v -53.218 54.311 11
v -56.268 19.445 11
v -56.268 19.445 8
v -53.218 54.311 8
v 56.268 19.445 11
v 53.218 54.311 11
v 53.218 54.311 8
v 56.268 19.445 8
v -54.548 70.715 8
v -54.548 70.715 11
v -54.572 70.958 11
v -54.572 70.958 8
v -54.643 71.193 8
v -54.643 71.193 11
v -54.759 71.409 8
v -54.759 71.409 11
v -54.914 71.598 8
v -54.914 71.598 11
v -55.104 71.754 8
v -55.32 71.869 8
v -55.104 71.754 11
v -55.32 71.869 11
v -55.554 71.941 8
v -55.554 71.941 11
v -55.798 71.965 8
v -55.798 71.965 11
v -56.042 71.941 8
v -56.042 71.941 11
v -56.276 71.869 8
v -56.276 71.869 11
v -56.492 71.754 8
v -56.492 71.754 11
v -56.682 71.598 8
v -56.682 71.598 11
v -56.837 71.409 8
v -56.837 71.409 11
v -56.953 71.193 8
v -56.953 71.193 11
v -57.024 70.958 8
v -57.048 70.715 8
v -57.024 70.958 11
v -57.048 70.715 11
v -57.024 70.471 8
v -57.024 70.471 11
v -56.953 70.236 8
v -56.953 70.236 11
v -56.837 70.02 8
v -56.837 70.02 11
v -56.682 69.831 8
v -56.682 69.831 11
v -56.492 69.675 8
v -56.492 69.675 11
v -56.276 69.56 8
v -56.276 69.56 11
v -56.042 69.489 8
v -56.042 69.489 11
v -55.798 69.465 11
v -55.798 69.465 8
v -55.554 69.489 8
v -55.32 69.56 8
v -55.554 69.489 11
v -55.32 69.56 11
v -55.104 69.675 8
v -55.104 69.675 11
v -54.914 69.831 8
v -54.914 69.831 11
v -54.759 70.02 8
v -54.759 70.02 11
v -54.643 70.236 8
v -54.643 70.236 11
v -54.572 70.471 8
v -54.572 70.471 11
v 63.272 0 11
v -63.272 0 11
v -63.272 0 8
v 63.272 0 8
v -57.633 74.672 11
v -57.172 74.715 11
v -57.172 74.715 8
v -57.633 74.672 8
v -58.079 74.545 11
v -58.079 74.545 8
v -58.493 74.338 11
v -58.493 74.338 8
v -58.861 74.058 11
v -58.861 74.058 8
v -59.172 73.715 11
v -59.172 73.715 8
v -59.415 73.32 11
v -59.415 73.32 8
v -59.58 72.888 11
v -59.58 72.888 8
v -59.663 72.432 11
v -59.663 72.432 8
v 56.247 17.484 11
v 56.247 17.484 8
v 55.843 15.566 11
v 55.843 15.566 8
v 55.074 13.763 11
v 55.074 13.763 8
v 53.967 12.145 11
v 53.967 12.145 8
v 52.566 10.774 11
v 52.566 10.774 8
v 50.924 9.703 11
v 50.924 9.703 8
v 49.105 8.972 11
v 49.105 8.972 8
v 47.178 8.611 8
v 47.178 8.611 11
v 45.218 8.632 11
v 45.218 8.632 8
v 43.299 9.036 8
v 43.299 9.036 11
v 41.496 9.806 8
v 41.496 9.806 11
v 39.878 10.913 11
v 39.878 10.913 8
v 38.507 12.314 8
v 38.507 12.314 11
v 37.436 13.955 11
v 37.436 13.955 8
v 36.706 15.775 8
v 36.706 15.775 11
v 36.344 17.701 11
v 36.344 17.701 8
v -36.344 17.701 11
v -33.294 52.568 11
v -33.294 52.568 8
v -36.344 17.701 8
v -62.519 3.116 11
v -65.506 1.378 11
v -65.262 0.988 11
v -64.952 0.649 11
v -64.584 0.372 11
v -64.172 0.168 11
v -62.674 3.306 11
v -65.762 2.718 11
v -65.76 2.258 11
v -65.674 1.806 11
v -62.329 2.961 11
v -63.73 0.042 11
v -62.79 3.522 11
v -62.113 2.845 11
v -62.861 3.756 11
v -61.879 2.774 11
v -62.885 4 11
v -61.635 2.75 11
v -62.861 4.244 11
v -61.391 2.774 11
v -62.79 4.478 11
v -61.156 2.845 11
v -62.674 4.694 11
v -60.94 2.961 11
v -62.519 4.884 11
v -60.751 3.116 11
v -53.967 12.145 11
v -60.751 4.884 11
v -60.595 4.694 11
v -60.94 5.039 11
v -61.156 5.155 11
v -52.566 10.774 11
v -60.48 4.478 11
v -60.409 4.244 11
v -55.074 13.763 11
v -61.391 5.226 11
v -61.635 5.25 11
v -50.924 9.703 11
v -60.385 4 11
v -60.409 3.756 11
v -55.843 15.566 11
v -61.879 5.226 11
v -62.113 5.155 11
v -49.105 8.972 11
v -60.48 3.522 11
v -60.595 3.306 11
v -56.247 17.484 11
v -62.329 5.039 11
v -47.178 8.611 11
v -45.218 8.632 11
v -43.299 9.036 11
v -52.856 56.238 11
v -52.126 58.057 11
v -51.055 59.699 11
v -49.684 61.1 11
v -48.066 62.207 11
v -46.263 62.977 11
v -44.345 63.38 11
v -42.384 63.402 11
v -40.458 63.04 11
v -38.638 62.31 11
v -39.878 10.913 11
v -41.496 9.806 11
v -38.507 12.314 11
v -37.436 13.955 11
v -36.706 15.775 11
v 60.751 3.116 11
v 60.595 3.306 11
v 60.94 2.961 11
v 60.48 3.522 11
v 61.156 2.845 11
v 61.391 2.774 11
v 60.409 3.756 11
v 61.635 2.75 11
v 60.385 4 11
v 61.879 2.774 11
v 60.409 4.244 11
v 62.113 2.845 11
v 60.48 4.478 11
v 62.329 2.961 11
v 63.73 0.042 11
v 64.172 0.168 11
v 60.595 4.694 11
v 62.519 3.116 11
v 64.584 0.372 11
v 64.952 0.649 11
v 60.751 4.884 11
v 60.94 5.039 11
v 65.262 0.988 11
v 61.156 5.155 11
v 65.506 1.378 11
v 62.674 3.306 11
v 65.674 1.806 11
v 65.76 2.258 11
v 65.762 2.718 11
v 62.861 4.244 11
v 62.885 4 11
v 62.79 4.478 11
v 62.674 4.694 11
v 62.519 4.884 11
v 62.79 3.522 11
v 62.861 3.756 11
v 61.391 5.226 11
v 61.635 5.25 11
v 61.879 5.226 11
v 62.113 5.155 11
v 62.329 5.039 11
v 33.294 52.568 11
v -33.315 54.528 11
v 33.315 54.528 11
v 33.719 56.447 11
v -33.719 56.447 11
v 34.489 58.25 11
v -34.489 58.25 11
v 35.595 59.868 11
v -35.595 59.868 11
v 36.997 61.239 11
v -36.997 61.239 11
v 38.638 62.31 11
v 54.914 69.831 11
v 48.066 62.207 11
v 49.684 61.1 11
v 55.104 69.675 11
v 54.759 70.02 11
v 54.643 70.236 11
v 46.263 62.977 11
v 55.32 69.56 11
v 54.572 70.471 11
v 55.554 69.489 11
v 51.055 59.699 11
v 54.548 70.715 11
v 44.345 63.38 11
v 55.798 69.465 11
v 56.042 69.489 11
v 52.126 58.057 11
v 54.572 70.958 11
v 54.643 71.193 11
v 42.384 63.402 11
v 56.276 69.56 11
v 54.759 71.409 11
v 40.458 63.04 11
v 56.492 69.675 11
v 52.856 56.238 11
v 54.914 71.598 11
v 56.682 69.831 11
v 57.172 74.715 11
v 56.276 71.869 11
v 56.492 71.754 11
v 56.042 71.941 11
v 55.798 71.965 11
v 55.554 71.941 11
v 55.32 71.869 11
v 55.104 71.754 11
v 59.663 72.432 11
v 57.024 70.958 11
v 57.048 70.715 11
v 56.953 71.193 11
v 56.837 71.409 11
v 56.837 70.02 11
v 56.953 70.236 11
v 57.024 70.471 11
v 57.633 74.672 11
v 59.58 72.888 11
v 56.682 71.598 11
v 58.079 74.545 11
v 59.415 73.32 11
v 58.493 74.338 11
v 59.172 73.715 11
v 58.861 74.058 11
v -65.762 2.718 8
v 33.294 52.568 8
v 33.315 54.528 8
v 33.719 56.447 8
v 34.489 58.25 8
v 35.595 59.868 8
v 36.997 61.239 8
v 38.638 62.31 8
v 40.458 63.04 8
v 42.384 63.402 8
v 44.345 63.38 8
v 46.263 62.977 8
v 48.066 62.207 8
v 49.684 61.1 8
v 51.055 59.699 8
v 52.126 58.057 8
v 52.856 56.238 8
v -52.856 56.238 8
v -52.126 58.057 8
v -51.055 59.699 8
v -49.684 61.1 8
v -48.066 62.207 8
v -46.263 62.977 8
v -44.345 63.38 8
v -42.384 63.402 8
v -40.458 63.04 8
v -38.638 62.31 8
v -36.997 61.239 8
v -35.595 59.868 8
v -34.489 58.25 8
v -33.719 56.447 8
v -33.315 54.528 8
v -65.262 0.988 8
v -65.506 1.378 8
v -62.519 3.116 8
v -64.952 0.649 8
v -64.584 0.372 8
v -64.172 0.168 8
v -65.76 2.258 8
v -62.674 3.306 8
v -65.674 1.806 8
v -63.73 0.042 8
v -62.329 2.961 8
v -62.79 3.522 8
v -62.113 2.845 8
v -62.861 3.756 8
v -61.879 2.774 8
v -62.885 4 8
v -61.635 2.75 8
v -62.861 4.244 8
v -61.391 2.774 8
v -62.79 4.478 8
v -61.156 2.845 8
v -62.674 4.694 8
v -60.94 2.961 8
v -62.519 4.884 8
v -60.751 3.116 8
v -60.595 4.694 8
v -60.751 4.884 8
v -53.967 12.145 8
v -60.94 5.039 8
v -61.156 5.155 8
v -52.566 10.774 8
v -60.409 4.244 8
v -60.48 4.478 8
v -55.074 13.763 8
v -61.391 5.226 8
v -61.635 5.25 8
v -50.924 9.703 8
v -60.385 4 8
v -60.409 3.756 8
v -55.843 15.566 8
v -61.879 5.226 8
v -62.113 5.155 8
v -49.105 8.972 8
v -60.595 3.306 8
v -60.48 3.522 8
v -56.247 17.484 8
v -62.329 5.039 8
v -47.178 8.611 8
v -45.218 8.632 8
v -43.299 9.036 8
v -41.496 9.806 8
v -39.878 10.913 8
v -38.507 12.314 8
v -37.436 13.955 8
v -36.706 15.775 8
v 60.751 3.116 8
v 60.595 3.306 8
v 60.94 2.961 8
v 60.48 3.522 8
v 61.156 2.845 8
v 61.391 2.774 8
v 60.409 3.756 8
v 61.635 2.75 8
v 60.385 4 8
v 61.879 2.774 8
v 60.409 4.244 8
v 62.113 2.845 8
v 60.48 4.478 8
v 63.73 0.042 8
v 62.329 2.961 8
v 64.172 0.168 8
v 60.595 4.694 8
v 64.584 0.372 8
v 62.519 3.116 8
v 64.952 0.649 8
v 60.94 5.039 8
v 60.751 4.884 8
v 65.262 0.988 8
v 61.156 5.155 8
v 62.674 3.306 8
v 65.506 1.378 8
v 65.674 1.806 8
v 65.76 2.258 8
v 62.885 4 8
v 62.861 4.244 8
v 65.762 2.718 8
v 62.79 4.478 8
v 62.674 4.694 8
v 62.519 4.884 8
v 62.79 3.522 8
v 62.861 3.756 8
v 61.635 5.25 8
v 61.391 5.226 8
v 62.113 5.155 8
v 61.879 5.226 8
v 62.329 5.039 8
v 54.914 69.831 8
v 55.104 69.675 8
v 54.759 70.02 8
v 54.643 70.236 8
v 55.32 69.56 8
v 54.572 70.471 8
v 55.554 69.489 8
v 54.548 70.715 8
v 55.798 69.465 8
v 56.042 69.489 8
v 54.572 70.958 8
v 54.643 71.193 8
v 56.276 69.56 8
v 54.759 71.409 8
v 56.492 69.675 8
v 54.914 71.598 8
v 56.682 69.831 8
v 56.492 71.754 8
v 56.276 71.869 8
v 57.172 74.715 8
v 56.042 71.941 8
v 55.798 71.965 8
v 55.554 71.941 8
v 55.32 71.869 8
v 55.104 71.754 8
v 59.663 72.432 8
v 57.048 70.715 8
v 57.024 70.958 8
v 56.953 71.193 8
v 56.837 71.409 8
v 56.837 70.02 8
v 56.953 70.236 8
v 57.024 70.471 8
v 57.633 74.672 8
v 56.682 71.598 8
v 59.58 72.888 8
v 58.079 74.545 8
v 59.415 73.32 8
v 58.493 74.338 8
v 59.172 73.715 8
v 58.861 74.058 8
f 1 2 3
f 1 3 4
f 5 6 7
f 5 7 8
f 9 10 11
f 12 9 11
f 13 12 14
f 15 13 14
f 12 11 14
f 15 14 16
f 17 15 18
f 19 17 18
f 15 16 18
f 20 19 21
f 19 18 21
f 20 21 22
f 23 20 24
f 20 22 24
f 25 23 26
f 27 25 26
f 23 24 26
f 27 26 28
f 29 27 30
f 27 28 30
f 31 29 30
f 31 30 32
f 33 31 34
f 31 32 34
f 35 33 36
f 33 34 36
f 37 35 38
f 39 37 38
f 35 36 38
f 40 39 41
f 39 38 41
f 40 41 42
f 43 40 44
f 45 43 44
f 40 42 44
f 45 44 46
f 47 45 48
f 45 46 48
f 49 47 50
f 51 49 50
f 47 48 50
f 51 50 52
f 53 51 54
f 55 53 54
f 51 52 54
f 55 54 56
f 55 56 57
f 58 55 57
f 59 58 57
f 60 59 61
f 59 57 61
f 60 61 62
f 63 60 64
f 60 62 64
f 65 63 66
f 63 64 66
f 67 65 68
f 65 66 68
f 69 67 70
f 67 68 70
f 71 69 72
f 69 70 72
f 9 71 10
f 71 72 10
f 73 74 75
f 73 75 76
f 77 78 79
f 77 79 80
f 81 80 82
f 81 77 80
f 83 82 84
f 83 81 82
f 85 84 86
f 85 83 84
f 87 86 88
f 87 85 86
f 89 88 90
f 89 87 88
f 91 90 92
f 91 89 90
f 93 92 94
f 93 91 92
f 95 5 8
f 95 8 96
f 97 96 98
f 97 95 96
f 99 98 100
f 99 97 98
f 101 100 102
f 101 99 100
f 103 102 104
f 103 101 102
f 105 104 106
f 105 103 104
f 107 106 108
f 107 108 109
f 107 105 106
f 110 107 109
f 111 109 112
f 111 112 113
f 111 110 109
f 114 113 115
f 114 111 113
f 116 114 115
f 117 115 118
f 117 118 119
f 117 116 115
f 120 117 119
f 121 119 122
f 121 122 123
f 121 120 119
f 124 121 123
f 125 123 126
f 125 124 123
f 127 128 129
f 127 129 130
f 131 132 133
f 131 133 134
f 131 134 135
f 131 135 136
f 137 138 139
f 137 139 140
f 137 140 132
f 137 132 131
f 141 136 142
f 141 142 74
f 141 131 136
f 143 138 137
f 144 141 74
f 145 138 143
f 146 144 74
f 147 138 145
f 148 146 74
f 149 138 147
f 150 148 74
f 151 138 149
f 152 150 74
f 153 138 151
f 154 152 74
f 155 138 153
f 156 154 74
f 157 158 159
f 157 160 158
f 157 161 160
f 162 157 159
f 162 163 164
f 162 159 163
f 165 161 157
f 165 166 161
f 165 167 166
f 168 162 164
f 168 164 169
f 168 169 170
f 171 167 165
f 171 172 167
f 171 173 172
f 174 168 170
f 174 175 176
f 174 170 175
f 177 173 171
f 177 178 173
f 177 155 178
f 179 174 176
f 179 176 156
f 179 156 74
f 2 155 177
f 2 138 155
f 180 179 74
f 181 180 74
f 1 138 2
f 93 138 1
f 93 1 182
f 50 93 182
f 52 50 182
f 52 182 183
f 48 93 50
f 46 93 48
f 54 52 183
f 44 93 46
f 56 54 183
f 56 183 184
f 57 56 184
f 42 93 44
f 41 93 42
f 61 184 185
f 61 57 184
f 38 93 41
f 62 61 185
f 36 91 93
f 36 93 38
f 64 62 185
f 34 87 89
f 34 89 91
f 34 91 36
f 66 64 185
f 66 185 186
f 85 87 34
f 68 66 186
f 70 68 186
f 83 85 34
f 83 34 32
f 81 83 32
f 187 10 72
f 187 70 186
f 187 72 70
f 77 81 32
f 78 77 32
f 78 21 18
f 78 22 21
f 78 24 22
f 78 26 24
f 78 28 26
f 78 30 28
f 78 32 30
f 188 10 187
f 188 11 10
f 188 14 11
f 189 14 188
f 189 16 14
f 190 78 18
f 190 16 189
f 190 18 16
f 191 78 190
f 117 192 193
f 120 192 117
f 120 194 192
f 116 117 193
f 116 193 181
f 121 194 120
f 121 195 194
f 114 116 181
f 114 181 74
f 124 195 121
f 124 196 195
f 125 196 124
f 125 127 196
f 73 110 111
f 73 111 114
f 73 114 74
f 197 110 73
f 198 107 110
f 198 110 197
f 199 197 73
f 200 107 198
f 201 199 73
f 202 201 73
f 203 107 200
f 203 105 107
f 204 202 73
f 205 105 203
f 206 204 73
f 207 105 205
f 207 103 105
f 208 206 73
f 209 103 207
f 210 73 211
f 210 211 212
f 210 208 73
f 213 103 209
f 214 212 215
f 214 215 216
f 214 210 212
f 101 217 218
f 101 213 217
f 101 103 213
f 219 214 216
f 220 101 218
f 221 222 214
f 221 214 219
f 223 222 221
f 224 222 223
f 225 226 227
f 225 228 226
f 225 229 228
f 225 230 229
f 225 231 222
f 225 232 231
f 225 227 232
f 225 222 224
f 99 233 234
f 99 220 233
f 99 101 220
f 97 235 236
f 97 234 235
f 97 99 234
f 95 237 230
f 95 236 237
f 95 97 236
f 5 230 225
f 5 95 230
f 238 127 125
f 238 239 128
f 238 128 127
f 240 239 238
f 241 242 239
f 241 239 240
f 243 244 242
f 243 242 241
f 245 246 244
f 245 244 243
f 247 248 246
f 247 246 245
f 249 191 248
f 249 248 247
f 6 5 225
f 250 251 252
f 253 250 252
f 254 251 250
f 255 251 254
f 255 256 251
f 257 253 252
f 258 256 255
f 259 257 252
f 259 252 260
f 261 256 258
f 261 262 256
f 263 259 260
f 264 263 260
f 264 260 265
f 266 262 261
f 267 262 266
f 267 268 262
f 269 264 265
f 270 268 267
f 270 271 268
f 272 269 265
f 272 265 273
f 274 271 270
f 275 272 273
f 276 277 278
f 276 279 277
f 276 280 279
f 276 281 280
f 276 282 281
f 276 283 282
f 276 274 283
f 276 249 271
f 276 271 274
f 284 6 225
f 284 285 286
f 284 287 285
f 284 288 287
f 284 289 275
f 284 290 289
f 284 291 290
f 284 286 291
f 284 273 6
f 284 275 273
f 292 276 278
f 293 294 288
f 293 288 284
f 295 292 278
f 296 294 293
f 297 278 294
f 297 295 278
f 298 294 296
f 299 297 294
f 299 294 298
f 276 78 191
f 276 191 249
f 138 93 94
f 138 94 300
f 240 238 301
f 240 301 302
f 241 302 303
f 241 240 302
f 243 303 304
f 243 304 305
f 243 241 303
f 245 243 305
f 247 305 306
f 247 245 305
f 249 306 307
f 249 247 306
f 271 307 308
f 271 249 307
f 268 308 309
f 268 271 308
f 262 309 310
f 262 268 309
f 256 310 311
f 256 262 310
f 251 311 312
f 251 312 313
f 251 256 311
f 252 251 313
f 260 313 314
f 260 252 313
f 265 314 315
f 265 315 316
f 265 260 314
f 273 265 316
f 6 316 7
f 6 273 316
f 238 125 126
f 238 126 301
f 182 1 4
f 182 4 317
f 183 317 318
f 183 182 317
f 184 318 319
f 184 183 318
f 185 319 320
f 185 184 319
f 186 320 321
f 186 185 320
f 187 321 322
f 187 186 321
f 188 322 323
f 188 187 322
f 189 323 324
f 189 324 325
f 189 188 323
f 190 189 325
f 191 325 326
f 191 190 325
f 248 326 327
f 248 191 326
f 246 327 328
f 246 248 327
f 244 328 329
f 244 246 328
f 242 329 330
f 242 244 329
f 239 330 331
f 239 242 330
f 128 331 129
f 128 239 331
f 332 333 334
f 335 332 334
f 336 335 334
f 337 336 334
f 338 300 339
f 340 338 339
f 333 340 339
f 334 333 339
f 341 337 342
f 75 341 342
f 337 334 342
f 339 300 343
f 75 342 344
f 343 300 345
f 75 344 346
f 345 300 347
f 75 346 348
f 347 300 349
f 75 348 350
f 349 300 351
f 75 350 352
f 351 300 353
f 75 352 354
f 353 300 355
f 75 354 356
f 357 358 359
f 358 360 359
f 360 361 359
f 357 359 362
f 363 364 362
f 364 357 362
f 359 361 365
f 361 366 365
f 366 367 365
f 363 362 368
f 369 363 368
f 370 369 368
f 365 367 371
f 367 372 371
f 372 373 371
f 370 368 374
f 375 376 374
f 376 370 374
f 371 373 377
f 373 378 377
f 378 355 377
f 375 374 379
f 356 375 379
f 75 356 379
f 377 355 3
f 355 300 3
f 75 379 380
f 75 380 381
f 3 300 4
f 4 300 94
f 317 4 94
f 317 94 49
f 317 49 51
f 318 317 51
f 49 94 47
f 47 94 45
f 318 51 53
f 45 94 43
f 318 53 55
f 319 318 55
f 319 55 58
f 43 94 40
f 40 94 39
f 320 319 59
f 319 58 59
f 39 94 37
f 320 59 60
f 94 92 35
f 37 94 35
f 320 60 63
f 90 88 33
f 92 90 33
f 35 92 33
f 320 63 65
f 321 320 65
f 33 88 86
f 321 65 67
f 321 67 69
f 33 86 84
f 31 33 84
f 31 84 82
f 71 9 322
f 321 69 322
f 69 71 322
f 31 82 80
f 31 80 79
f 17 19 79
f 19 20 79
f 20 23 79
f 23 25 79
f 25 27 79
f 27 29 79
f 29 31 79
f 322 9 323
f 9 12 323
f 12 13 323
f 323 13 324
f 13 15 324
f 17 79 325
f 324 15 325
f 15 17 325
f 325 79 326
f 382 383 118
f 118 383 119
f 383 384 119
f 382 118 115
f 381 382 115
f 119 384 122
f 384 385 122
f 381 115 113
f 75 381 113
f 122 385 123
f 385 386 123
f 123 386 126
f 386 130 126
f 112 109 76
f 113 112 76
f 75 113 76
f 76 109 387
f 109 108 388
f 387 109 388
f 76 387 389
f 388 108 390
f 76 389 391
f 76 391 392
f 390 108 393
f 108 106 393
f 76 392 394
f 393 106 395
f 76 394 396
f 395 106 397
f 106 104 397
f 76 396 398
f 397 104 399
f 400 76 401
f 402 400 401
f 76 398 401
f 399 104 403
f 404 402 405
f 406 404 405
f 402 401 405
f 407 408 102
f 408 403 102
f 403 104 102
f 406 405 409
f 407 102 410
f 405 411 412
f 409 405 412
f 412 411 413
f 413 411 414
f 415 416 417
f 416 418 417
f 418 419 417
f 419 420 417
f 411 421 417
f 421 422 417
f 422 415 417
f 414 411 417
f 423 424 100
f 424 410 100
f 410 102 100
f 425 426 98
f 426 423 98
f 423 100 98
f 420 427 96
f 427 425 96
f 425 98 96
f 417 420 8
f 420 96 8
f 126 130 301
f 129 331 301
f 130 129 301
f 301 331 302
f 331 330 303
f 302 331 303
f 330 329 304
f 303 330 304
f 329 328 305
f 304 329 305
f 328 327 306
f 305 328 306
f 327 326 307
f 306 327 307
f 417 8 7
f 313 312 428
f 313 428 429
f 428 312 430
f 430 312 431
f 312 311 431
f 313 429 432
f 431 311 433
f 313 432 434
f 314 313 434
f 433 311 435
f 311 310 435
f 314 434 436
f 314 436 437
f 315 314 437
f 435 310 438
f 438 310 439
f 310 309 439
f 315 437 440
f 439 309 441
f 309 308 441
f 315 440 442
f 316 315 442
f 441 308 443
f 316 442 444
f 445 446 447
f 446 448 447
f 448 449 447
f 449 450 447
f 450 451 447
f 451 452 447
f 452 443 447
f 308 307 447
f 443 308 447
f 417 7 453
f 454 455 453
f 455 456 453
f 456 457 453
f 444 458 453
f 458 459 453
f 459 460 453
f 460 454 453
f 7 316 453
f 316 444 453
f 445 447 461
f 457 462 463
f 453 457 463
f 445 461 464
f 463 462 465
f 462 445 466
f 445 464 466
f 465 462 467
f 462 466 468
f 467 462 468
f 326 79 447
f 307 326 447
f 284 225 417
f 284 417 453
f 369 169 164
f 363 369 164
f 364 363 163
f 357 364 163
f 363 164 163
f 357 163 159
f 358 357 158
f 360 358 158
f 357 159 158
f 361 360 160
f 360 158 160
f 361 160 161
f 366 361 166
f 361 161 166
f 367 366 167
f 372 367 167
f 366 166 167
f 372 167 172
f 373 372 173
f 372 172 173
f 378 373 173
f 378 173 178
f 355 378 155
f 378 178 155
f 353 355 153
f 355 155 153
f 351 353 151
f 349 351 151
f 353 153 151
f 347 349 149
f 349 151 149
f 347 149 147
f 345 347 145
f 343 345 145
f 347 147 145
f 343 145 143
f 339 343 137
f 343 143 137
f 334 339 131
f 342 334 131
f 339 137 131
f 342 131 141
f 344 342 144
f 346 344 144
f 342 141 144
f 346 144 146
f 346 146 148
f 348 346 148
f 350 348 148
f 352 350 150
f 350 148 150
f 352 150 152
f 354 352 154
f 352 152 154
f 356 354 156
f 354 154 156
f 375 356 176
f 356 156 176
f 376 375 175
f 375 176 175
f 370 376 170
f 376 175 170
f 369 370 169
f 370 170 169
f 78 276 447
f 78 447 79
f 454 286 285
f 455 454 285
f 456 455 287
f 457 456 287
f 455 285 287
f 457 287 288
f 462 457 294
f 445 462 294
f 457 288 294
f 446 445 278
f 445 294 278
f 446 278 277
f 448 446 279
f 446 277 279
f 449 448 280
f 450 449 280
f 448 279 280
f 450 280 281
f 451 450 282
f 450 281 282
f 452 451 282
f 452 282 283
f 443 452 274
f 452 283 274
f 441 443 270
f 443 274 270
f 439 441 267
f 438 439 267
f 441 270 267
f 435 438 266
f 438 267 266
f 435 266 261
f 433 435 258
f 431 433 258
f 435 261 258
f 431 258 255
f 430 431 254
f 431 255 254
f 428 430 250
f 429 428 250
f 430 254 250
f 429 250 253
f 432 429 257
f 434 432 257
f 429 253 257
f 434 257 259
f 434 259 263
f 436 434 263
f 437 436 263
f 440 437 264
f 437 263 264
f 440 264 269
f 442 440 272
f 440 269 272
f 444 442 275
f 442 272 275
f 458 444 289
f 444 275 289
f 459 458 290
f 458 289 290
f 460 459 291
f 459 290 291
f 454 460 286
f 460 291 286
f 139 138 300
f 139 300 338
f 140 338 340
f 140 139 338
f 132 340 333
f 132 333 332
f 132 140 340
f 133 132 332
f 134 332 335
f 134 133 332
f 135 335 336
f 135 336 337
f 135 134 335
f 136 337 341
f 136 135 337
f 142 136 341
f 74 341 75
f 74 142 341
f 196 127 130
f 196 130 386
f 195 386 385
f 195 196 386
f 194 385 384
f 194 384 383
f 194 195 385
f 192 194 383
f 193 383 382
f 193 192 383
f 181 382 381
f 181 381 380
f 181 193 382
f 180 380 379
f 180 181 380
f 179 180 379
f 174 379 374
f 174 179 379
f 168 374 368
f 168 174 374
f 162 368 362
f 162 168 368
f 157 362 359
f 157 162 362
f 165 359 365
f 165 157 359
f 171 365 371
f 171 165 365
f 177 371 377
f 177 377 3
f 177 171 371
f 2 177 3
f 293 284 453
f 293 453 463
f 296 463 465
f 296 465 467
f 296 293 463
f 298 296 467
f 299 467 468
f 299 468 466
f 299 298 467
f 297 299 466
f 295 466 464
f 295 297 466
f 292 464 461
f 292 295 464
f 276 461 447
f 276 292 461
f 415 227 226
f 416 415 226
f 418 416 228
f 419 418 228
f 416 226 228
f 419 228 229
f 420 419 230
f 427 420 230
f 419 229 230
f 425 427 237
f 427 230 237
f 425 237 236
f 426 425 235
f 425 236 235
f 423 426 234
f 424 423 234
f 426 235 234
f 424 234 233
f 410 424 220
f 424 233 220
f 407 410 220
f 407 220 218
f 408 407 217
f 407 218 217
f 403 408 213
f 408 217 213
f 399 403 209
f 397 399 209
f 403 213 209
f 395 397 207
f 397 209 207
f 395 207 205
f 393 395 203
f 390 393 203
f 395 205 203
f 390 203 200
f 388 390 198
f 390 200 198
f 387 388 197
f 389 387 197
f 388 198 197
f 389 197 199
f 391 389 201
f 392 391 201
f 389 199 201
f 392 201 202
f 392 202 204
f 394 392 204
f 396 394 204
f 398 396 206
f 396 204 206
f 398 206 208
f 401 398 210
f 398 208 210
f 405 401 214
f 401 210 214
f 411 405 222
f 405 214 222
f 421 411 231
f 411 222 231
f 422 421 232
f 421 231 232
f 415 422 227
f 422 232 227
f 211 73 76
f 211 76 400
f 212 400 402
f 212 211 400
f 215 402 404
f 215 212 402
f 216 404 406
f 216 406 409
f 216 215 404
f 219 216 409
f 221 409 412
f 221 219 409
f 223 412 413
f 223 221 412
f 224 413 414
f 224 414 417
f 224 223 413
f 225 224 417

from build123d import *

# Parameters (mm, degrees)
SKETCH1_R           = 1.25
BOSS_EXTRUDE1_DEPTH = 3


with BuildPart() as part:
    # Sketch1 → Boss-Extrude1 (new body)
    with BuildSketch(Plane.XY.offset(11)):
        with BuildLine():
            Line((57.172491377, 74.714602367), (-57.172491341, 74.714602367))
            ThreePointArc((-57.172491341, 74.714602367), (-58.861466857, 74.05779571), (-59.662978082, 72.432491728))
            Line((-59.662978082, 72.432491728), (-65.762215507, 2.717889374))
            ThreePointArc((-65.762215507, 2.717889374), (-65.1149221, 0.811024486), (-63.271728747, 0))
            Line((-63.271728747, 0), (63.271728783, 0))
            ThreePointArc((63.271728783, 0), (65.114922137, 0.811024486), (65.762215543, 2.717889374))
            Line((65.762215543, 2.717889374), (59.662978119, 72.432491728))
            ThreePointArc((59.662978119, 72.432491728), (58.861466894, 74.05779571), (57.172491377, 74.714602367))
        make_face()
        with Locations((55.797994598, 70.714602357)):
            Circle(SKETCH1_R, mode=Mode.SUBTRACT)
        with Locations((-61.634765996, 4)):
            Circle(SKETCH1_R, mode=Mode.SUBTRACT)
        with Locations((-55.797994598, 70.714602357)):
            Circle(SKETCH1_R, mode=Mode.SUBTRACT)
        with Locations((61.634765996, 4)):
            Circle(SKETCH1_R, mode=Mode.SUBTRACT)
        with BuildLine():
            Line((53.217813713, 54.311351811), (56.268264715, 19.444537378))
            ThreePointArc((56.268264715, 19.444537378), (47.177875152, 8.611032956), (36.34437073, 17.701422518))
            Line((36.34437073, 17.701422518), (33.293919727, 52.56823695))
            ThreePointArc((33.293919727, 52.56823695), (42.38430929, 63.401741373), (53.217813713, 54.311351811))
        make_face(mode=Mode.SUBTRACT)
        with BuildLine():
            Line((-33.293919727, 52.56823695), (-36.34437073, 17.701422518))
            ThreePointArc((-36.34437073, 17.701422518), (-47.17787515, 8.611032957), (-56.268264712, 19.444537376))
            Line((-56.268264712, 19.444537376), (-53.217813716, 54.311351809))
            ThreePointArc((-53.217813716, 54.311351809), (-42.384309292, 63.401741375), (-33.293919727, 52.56823695))
        make_face(mode=Mode.SUBTRACT)
    extrude(amount=-BOSS_EXTRUDE1_DEPTH)


solid = part.part
